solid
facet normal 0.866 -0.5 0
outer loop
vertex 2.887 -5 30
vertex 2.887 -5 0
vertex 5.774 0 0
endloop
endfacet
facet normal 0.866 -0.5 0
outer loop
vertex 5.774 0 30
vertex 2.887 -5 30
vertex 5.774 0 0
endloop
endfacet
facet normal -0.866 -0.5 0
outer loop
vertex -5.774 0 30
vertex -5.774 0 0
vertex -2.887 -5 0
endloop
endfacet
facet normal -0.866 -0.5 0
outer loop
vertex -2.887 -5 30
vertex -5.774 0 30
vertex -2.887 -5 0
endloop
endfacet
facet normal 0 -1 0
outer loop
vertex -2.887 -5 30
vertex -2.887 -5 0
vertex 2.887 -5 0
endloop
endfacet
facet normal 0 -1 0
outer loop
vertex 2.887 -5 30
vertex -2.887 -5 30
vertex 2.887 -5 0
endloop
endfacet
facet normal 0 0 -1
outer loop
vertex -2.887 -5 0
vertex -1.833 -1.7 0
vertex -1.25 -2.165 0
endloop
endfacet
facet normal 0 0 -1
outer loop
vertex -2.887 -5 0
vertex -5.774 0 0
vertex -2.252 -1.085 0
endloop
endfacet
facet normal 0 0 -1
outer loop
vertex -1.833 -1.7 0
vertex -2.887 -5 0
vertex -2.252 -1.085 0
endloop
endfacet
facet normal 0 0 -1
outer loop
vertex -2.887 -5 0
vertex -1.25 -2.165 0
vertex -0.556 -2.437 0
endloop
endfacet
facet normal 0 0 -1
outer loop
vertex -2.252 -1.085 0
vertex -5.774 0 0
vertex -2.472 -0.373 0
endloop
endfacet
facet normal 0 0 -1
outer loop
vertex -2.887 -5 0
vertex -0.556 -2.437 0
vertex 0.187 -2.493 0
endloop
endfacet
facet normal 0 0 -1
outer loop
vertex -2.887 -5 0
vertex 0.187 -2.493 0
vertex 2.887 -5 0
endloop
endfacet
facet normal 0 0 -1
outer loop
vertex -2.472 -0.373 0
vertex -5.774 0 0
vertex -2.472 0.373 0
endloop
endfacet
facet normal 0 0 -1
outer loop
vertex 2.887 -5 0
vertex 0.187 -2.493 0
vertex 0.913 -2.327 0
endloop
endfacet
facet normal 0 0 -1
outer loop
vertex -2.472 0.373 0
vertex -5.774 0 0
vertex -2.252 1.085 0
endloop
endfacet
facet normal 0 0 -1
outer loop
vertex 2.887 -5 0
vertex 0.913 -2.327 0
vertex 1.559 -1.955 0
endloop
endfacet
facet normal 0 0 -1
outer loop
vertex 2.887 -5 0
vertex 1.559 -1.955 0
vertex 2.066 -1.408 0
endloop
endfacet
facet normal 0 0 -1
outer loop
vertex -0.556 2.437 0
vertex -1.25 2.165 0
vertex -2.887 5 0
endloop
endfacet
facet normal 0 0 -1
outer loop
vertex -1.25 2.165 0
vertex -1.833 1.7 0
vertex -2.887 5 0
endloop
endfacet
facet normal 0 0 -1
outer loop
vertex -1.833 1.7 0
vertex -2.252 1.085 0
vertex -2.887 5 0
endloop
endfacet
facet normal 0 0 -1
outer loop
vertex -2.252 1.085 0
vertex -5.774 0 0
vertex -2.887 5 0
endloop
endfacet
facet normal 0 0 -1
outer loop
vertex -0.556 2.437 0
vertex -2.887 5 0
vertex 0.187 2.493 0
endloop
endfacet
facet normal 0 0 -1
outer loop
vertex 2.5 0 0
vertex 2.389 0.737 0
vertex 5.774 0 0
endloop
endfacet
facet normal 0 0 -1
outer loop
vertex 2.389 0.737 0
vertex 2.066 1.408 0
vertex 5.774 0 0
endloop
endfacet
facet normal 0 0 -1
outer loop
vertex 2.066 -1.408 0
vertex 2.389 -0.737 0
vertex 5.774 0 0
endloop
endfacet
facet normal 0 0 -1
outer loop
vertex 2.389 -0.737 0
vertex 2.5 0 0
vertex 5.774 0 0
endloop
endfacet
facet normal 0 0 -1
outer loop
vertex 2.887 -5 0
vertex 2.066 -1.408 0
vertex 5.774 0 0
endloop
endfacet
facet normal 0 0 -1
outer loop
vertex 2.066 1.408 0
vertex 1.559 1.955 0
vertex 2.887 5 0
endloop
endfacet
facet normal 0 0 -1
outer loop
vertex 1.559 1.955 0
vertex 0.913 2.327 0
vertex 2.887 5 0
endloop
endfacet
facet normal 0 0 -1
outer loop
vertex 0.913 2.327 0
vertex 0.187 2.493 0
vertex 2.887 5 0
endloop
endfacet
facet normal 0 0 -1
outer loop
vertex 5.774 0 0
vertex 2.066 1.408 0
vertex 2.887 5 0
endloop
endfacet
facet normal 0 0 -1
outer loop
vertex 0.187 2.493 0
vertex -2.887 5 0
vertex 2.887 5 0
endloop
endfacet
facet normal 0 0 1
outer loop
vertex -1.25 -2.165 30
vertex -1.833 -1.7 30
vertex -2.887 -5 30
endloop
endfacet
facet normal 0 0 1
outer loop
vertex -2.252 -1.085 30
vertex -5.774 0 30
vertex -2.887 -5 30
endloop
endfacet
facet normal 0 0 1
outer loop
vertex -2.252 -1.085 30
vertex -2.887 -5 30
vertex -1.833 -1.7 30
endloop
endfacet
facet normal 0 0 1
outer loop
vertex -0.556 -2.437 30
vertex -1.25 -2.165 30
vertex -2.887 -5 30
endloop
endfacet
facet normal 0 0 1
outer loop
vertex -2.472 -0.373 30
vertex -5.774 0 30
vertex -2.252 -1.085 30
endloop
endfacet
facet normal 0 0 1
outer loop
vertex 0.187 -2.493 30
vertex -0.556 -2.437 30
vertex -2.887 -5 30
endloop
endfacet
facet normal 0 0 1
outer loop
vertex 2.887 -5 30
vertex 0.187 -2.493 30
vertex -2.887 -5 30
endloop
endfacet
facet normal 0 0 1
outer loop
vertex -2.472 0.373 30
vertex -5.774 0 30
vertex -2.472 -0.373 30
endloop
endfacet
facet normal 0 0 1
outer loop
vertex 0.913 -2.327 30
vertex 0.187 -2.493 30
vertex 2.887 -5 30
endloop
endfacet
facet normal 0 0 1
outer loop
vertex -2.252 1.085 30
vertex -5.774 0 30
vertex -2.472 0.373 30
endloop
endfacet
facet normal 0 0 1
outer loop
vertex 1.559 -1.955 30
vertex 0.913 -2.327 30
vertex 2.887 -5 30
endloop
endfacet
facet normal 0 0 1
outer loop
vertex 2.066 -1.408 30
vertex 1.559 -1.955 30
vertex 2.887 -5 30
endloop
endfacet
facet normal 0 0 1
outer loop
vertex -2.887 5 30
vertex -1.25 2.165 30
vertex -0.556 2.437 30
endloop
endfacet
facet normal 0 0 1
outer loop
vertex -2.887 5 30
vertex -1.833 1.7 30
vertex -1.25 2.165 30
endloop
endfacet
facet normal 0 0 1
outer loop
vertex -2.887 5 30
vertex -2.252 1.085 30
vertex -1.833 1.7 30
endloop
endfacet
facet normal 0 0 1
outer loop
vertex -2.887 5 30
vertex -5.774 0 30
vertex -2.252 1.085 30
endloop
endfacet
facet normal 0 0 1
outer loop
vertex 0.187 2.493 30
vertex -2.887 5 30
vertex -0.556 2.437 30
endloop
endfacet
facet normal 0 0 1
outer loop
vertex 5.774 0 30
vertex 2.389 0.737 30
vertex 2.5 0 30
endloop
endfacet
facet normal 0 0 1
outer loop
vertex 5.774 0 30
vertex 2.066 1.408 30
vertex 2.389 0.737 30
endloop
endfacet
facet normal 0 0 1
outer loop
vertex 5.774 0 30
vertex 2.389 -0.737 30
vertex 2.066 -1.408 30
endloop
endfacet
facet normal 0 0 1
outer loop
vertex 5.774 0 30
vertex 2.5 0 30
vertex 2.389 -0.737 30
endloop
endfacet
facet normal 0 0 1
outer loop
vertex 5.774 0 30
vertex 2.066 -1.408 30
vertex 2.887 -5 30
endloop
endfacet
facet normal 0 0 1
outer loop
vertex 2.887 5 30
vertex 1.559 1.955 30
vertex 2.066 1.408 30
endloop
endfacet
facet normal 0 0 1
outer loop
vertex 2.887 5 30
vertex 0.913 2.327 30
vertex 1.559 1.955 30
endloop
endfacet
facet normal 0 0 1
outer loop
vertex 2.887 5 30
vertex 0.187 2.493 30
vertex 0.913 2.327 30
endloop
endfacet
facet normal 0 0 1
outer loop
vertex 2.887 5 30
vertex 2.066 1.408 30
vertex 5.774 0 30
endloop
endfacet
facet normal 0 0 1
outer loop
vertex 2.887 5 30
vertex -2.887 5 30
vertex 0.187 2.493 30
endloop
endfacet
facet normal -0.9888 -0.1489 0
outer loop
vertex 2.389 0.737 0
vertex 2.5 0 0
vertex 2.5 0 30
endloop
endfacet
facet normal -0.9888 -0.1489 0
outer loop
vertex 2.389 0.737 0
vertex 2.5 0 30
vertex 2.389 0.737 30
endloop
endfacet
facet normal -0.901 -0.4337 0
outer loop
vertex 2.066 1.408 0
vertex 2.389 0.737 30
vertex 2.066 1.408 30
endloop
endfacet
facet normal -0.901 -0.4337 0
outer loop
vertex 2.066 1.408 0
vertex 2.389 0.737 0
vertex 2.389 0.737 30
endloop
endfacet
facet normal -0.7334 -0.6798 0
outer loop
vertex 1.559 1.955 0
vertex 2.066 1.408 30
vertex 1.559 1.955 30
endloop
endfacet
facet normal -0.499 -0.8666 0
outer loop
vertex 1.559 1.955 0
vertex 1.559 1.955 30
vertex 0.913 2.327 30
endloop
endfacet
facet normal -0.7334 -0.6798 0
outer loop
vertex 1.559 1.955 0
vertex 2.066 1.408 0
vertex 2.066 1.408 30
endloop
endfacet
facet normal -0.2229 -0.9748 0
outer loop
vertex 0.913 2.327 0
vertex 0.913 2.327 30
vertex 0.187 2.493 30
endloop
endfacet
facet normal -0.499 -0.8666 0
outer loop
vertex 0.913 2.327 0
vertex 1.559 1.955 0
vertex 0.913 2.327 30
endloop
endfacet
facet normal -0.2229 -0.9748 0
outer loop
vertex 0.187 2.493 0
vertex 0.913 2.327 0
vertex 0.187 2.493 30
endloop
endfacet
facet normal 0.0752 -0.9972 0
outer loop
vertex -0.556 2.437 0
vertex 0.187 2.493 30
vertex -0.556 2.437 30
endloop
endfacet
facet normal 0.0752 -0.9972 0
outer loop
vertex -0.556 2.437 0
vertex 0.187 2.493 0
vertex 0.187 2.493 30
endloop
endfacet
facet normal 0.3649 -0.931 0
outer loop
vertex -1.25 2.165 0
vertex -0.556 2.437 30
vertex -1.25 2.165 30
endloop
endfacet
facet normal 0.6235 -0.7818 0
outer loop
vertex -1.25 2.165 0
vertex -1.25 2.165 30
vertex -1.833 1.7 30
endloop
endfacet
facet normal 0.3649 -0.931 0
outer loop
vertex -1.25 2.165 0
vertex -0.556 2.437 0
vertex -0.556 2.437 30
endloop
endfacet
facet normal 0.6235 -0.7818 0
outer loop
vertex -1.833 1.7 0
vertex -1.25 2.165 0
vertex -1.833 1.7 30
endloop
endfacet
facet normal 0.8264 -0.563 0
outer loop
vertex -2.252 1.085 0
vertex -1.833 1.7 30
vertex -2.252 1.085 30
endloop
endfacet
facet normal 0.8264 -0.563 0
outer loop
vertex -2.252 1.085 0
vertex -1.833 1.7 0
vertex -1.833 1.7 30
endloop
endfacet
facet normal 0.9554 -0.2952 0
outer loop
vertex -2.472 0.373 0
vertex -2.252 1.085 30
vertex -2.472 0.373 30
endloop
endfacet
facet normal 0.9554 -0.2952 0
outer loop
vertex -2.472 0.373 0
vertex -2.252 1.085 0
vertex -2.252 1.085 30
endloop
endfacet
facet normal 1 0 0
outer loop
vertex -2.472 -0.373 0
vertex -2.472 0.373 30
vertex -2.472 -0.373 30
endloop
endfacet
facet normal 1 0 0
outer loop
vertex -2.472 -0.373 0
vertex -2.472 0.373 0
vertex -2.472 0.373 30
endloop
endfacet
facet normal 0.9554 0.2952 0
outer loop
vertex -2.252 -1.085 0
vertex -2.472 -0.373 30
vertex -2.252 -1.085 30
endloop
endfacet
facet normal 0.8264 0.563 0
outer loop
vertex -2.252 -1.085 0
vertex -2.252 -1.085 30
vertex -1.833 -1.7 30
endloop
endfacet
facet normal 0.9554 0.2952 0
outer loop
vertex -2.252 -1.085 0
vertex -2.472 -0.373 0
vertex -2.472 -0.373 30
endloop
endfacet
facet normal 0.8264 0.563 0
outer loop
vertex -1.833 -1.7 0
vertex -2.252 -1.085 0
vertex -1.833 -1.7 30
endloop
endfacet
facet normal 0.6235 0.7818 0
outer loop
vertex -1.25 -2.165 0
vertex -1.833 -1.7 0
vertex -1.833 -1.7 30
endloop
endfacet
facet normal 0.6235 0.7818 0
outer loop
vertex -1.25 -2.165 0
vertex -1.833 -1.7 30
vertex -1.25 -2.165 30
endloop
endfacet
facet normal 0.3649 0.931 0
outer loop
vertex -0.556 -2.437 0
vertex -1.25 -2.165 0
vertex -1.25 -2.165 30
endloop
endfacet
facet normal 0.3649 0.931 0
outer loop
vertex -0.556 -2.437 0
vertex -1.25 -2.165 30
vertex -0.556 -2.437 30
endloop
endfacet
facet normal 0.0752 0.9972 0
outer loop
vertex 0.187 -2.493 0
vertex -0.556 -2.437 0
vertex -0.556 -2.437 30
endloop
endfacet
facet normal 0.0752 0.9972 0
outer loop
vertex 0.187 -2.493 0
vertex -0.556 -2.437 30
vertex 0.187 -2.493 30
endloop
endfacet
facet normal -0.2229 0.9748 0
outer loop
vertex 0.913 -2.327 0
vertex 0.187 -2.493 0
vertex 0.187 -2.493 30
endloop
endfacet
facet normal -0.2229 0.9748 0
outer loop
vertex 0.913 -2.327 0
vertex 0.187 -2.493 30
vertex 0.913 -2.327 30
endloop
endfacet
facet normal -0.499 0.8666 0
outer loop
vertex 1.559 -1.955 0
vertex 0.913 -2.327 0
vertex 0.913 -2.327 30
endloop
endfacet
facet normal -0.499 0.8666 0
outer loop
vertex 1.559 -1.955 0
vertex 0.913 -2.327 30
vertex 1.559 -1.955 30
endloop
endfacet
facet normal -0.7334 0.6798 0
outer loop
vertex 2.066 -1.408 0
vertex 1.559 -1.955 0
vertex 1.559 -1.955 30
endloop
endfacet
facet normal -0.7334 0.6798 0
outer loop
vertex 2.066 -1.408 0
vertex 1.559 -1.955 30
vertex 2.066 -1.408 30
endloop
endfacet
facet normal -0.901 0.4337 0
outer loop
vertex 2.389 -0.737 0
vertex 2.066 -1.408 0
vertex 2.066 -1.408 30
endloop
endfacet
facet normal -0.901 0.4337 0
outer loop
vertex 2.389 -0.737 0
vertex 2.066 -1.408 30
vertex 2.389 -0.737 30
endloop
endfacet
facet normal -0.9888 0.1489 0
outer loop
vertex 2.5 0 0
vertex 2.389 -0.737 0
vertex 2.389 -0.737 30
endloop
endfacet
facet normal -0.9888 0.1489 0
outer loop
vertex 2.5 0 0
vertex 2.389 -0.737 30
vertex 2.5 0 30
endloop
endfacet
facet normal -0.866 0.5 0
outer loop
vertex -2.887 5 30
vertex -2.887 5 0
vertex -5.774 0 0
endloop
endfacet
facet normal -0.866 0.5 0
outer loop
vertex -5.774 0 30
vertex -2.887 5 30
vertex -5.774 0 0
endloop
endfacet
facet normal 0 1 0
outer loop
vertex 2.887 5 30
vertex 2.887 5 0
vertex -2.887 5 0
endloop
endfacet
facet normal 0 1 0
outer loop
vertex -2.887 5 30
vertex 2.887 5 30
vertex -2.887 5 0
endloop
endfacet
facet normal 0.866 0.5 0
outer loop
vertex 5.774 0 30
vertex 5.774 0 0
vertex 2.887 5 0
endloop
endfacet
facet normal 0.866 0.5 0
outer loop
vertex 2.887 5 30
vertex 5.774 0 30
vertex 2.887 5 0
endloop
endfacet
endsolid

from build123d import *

# Parameters (mm, degrees)
BOSS_EXTRUDE1_DEPTH = 30
SKETCH2_R           = 2.5
CUT_EXTRUDE1_DEPTH  = 20


with BuildPart() as part:
    # Sketch1 → Boss-Extrude1 (new body)
    with BuildSketch(Plane.XY):
        Polygon((-5.773502692, 0), (-2.886751346, -5), (2.886751346, -5), (5.773502692, 0), (2.886751346, 5), (-2.886751346, 5), align=None)
    extrude(amount=BOSS_EXTRUDE1_DEPTH)

    # Sketch2 → Cut-Extrude1 (cut)
    with BuildSketch(Plane.XY.offset(30)):
        Circle(SKETCH2_R)
    cut_extrude1 = extrude(amount=-CUT_EXTRUDE1_DEPTH, mode=Mode.SUBTRACT)

    # Mirror1: Cut-Extrude1 across plane
    add(cut_extrude1.mirror(Plane.XY.offset(15)), mode=Mode.SUBTRACT)


solid = part.part
